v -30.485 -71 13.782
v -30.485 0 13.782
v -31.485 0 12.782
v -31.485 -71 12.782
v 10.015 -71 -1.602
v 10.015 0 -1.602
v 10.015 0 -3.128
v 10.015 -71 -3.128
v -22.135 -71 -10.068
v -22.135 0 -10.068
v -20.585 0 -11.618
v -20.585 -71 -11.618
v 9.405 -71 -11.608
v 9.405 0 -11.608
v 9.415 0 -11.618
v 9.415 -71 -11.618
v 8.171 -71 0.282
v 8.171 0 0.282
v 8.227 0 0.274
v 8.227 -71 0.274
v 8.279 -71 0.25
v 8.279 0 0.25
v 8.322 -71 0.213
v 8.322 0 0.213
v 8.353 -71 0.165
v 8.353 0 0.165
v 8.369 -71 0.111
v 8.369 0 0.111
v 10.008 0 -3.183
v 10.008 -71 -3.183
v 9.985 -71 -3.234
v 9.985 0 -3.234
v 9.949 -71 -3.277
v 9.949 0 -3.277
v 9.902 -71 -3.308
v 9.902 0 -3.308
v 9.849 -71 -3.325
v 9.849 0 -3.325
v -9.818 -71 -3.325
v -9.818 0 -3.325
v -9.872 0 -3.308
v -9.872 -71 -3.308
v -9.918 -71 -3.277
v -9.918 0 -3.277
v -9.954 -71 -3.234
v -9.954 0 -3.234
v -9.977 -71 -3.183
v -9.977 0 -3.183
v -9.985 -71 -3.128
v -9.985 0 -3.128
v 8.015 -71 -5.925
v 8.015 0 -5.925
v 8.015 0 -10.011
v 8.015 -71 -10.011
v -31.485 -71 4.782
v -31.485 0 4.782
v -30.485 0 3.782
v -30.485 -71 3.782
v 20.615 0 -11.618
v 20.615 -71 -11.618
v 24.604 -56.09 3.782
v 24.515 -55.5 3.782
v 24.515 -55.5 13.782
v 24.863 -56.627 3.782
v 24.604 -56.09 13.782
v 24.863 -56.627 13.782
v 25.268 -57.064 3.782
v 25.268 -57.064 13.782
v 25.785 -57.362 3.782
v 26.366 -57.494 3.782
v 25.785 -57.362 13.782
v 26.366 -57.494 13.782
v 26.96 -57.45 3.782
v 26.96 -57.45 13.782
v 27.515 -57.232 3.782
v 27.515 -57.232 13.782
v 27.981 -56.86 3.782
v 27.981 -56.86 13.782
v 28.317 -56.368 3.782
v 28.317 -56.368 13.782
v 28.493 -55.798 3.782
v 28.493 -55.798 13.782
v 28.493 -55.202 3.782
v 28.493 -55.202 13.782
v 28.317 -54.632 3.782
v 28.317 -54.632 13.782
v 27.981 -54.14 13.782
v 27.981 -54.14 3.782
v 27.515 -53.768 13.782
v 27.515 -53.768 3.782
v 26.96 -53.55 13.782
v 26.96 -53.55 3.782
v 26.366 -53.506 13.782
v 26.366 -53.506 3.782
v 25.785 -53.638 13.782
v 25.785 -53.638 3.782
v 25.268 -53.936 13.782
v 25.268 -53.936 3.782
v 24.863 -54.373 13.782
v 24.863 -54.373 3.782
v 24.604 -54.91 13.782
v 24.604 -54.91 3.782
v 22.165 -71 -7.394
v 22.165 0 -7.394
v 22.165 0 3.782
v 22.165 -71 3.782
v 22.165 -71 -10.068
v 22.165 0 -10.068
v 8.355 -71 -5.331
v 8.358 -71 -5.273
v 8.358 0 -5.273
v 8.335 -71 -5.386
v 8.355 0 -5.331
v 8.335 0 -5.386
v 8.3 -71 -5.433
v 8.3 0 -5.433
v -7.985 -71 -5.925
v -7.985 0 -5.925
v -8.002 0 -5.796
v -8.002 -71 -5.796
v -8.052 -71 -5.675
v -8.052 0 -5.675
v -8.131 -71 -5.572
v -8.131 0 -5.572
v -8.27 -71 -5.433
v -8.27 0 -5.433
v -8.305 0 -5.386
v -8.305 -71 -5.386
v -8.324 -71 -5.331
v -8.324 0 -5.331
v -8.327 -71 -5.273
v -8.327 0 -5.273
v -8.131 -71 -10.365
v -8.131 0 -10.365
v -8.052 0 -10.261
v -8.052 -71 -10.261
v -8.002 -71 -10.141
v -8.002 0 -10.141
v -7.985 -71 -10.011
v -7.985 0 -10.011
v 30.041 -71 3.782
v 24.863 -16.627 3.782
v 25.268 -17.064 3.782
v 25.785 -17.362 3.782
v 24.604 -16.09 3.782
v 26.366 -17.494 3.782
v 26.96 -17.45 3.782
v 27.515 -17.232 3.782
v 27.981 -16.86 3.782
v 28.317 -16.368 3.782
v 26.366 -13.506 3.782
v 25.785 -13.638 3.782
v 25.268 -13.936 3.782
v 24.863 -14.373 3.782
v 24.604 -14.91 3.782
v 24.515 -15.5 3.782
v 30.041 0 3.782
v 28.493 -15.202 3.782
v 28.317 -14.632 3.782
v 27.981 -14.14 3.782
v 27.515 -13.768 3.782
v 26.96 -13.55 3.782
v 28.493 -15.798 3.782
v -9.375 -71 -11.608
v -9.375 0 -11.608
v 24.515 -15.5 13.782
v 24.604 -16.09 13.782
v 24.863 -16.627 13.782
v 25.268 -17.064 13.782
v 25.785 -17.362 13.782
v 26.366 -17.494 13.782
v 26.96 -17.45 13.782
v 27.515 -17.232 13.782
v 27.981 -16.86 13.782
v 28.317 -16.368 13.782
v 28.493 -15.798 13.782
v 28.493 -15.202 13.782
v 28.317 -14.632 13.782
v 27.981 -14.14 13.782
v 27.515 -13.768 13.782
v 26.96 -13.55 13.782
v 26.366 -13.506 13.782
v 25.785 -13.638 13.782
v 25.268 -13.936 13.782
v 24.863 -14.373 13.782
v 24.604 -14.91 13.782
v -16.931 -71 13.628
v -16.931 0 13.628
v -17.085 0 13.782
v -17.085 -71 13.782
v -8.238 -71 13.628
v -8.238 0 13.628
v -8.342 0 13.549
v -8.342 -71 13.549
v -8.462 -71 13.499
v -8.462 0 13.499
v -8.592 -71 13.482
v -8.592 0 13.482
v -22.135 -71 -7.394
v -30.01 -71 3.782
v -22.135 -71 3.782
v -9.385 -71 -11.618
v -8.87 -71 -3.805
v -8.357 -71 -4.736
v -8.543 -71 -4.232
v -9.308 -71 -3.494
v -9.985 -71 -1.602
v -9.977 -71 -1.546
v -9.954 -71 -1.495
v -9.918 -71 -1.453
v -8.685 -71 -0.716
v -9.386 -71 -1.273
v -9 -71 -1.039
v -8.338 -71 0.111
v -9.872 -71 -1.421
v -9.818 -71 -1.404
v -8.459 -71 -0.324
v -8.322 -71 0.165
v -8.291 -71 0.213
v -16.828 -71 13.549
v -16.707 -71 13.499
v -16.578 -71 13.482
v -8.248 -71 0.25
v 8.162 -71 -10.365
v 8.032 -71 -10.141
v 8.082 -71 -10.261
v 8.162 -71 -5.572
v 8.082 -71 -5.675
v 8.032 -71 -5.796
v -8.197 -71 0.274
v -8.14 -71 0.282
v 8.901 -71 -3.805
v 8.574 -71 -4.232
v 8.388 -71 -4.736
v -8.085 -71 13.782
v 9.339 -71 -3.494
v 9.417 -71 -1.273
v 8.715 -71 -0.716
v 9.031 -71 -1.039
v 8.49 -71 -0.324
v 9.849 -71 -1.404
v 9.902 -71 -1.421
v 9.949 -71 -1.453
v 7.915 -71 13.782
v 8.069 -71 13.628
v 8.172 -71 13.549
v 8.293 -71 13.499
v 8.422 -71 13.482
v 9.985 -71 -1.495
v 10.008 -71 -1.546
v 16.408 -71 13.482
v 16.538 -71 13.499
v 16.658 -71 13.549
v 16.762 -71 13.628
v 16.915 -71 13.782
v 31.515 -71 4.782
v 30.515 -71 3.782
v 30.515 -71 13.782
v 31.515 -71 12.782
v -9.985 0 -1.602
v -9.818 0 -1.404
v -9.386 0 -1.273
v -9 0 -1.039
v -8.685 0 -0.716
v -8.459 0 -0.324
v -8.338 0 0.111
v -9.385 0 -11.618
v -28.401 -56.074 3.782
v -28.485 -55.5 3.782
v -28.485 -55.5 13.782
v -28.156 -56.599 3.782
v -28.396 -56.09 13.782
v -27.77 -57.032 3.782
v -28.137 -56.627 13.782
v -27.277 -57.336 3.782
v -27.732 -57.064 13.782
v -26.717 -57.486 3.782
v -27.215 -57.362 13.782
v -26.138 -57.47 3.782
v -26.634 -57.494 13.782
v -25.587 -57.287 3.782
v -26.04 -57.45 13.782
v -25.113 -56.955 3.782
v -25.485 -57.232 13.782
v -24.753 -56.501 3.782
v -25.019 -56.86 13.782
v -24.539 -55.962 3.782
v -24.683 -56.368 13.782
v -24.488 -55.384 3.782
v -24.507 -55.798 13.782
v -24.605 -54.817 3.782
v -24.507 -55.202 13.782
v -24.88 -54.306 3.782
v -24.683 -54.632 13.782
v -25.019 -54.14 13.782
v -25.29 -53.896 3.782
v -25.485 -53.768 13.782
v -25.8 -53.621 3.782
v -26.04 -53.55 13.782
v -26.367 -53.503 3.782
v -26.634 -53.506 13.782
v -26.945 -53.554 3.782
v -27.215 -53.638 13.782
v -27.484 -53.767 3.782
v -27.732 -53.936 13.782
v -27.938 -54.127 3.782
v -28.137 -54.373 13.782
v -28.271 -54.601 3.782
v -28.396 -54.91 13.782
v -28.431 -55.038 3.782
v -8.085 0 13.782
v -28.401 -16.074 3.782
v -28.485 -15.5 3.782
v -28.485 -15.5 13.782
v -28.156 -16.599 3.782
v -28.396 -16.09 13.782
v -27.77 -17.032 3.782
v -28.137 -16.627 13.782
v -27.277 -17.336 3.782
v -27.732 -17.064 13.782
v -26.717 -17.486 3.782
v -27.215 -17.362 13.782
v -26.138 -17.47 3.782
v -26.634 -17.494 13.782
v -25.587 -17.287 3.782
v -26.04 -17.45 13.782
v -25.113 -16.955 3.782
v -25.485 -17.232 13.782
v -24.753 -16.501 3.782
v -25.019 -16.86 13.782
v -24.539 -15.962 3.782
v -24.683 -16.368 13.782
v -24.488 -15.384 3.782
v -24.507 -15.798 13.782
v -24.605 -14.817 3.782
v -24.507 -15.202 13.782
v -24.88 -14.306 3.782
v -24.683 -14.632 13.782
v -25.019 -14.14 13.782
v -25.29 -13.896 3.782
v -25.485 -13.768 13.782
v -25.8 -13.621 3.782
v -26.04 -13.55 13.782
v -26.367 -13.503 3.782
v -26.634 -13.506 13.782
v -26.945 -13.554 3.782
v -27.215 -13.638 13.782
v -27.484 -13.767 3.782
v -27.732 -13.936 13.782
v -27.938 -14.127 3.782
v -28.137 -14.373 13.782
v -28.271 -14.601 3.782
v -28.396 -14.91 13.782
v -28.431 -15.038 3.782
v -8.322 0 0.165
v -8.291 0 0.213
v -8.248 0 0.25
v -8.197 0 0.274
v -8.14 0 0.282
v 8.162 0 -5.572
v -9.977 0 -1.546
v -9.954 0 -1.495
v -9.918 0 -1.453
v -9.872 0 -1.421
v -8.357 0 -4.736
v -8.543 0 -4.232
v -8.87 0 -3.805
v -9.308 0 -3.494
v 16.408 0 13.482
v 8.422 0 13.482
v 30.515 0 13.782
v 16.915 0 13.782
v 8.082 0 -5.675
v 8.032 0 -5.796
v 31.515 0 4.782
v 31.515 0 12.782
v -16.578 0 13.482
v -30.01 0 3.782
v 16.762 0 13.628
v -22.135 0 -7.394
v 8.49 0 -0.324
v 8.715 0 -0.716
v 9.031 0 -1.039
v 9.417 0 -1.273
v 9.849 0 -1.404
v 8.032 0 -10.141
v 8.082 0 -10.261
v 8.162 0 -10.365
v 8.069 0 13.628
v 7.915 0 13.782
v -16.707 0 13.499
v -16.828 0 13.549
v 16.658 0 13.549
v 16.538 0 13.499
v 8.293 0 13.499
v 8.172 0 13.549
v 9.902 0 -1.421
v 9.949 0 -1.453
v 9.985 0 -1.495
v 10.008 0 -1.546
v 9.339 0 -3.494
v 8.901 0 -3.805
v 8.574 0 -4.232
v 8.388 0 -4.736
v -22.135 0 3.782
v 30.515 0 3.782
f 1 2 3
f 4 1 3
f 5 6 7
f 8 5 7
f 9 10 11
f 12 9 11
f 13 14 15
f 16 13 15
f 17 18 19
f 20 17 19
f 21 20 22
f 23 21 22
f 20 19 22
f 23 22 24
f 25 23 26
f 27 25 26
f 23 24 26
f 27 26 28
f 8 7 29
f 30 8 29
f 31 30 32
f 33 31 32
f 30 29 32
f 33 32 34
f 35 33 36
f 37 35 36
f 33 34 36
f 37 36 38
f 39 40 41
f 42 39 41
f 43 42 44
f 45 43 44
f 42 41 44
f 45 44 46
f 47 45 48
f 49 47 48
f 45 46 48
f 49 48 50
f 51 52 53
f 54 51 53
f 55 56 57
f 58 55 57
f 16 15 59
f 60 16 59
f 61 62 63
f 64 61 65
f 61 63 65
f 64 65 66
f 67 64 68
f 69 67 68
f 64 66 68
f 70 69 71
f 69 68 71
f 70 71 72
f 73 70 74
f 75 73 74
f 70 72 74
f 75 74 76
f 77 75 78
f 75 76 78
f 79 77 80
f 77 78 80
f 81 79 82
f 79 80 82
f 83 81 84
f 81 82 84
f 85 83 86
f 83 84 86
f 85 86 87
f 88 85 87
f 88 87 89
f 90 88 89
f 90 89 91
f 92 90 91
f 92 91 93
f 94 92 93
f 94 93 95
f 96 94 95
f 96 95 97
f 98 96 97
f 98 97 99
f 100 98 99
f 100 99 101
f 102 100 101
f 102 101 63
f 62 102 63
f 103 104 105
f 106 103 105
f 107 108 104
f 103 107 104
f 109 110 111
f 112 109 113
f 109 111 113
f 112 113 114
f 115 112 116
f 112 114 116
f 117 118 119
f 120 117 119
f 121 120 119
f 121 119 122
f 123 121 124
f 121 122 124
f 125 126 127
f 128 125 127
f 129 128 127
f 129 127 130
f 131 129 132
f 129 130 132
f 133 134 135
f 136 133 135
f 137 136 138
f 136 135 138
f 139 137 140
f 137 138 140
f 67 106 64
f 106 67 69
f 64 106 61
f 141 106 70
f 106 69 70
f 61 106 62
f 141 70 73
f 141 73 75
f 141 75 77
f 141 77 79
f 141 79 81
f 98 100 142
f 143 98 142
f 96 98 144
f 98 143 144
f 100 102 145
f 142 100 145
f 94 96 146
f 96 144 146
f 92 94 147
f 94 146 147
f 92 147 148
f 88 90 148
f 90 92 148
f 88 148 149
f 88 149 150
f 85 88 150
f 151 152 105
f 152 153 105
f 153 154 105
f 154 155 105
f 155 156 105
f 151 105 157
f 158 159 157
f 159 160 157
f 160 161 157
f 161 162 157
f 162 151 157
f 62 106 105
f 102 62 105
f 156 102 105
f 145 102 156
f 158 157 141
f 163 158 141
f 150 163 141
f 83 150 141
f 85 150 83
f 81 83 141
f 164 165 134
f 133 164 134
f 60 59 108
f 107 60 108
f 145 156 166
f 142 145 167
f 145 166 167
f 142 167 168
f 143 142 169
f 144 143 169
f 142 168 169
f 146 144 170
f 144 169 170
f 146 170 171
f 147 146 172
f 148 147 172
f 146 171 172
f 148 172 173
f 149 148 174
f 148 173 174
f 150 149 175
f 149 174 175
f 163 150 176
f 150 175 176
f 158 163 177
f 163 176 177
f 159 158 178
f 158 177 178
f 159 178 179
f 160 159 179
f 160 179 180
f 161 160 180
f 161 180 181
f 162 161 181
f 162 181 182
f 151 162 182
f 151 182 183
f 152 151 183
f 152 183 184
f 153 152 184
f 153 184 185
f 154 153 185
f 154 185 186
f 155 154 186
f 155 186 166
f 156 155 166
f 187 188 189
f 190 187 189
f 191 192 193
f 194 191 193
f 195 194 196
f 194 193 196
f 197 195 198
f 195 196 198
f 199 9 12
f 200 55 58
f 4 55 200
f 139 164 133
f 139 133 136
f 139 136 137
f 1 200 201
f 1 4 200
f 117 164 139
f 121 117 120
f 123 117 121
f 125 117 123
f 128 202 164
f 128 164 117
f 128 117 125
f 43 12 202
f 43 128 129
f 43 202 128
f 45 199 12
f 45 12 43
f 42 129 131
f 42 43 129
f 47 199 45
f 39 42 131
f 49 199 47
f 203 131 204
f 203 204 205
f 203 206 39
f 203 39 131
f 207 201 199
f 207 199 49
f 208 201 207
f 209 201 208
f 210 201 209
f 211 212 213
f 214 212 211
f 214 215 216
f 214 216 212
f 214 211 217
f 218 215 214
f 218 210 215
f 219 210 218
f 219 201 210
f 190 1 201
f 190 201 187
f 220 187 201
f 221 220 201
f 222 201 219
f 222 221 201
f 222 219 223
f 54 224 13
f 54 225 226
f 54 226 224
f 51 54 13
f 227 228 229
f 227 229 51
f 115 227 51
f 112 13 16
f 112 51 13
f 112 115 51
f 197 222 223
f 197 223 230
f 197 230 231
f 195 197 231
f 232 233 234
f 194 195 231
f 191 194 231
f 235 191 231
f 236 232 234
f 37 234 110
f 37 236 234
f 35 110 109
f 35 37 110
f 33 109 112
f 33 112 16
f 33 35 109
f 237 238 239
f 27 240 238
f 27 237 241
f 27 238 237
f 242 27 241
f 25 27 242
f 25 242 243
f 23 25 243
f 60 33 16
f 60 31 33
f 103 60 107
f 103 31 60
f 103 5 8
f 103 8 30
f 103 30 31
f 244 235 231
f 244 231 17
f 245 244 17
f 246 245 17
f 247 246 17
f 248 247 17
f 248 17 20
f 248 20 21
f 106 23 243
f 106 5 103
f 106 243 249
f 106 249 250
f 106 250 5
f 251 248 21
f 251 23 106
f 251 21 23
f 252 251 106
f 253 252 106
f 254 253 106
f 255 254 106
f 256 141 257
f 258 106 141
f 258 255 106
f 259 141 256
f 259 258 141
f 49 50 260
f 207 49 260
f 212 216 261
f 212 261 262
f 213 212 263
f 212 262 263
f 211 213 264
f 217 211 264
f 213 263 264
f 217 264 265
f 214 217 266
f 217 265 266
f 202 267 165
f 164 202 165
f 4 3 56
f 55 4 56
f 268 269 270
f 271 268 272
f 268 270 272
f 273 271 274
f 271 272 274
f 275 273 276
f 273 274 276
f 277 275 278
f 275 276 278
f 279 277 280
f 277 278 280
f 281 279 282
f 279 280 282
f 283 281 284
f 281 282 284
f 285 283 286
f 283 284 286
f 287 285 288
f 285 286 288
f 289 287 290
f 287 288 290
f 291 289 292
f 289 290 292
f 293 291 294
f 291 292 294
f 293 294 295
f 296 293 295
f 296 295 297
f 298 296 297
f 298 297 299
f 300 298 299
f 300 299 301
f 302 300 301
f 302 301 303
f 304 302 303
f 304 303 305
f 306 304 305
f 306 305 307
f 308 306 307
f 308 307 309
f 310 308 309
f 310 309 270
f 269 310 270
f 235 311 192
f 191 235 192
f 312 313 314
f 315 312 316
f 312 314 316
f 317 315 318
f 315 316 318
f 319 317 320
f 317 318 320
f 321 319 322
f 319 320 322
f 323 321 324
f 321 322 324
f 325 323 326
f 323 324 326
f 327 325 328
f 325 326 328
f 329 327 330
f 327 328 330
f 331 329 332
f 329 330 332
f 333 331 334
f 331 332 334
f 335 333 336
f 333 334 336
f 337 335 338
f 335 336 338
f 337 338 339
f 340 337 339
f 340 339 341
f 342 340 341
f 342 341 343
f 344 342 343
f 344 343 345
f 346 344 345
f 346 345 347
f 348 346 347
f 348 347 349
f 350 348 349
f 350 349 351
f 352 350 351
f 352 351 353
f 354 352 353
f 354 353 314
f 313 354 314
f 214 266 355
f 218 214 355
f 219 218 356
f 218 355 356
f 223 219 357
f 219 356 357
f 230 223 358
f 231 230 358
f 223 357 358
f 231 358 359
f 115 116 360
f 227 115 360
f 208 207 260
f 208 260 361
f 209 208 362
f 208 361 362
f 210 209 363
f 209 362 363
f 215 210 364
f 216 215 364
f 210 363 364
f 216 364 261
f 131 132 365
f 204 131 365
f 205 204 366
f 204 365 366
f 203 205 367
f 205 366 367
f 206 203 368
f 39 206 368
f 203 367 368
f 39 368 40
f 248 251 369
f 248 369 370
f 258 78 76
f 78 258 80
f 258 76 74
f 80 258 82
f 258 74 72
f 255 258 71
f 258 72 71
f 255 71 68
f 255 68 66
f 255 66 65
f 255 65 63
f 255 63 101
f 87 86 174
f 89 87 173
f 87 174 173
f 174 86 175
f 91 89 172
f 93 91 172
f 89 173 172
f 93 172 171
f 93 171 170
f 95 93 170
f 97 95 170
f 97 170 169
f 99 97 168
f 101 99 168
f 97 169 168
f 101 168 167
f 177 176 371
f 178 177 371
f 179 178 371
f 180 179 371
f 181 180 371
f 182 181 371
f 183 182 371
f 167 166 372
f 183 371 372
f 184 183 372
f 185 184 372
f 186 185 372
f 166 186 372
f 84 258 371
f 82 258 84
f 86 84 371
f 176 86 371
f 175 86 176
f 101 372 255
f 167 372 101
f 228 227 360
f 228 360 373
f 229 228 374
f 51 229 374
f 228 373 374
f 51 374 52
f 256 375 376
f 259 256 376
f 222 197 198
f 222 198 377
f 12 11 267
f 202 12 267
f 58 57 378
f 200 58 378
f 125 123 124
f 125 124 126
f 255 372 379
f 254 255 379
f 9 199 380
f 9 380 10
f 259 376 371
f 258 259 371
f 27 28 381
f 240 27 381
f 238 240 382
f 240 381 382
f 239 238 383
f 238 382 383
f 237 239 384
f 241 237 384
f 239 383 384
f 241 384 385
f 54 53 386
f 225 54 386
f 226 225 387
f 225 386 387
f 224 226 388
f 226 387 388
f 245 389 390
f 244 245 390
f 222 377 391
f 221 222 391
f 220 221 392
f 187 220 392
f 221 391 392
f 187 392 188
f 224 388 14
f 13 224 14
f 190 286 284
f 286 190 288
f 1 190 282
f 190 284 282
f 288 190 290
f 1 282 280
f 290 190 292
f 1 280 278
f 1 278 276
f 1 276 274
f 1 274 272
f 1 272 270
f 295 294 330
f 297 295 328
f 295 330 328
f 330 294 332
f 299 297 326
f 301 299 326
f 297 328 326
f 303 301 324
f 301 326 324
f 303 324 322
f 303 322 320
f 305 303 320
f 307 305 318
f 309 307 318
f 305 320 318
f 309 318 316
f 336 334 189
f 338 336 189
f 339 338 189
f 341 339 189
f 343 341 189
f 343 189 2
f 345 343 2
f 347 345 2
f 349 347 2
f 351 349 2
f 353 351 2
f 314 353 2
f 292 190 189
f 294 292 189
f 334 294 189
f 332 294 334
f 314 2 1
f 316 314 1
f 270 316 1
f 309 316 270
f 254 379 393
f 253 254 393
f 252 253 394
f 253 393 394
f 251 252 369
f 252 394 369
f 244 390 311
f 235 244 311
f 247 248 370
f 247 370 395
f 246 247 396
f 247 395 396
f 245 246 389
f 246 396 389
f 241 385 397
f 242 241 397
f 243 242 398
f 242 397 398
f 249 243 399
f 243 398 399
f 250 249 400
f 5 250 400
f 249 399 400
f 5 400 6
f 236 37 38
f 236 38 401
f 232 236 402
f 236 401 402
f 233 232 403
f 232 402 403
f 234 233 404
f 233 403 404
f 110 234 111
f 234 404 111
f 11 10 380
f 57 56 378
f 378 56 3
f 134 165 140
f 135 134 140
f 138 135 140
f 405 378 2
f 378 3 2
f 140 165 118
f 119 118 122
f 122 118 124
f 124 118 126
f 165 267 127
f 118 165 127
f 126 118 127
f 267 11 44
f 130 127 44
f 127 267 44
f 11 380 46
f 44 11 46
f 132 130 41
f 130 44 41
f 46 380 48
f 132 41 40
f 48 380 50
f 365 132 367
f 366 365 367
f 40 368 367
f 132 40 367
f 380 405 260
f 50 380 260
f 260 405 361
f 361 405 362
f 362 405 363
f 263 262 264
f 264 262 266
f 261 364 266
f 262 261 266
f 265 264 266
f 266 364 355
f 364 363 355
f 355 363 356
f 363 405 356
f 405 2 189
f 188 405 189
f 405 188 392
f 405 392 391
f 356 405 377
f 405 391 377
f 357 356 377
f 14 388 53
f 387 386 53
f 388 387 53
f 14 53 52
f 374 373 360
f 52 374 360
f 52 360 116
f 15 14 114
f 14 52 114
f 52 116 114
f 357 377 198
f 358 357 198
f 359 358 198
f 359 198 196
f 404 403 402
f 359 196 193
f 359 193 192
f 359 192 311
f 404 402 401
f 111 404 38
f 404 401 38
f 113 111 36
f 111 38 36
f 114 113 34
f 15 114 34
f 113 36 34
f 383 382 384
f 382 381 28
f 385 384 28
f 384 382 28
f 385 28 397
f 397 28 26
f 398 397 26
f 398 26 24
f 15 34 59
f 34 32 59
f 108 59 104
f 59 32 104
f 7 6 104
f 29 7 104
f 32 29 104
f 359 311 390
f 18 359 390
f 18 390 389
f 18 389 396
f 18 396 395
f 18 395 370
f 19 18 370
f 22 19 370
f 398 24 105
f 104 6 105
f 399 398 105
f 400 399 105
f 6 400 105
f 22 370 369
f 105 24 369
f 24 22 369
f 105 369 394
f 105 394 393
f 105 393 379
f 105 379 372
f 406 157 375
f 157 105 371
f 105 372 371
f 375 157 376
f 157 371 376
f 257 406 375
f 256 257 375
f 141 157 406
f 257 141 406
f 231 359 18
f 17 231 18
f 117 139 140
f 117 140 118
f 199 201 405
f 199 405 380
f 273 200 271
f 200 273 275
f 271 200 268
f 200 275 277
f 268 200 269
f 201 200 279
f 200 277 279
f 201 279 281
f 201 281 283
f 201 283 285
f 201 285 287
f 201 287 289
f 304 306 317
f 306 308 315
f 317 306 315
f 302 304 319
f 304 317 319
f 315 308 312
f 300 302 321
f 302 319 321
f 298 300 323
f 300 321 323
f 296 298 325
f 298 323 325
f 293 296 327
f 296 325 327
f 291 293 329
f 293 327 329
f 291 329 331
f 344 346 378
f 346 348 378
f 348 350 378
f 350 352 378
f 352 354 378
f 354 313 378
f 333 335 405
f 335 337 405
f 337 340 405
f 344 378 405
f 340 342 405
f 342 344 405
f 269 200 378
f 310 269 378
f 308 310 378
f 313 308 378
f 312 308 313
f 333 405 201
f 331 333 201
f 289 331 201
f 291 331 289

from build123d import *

# Parameters (mm, degrees)
F1_DEPTH = 71
F3_D     = 4


# Not quite as in the source:
# - ends of sketch curves that miss each other by under 0.0002 mm in the source are joined


with BuildPart() as f1:
    # F0 (on Front) → F1 (new body)
    with BuildSketch(Plane.XZ):
        with BuildLine():
            Line((8.1618498422, -10.3647895785), (9.4053820611, -11.6083214649))
            Line((9.4053820611, -11.6083214649), (9.415382064, -11.6183214649))
            Line((9.415382064, -11.6183214649), (20.6153802021, -11.6183214651))
            Line((20.6153802021, -11.6183214651), (22.165411006, -10.0682906612))
            Line((22.165411006, -10.0682906612), (22.1654110059, -7.3944052326))
            Line((22.1654110059, -7.3944052326), (22.1654110059, 3.7817118842))
            Line((22.1654110059, 3.7817118842), (30.0405793841, 3.7817118842))
            Line((30.0405793841, 3.7817118842), (30.515407573, 3.7817104728))
            Line((30.515407573, 3.7817104728), (31.5154075725, 4.7816793802))
            Line((31.5154075725, 4.7816793802), (31.5153703792, 12.7817118841))
            Line((31.5153703792, 12.7817118841), (30.5153417686, 13.7816508489))
            Line((30.5153417686, 13.7816508489), (16.9153093619, 13.7816508489))
            Line((16.9153093619, 13.7816508489), (16.7618646746, 13.6281611659))
            ThreePointArc((16.7618646746, 13.6281611659), (16.5996530095, 13.5197747929), (16.4083113037, 13.4817145544))
            Line((16.4083113037, 13.4817145544), (8.422430452, 13.4817145544))
            ThreePointArc((8.422430452, 13.4817145544), (8.2310887291, 13.5197747818), (8.0688770472, 13.6281611561))
            Line((8.0688770472, 13.6281611561), (7.9153584589, 13.7816508489))
            Line((7.9153584589, 13.7816508489), (-8.0846315282, 13.7816508491))
            Line((-8.0846315282, 13.7816508491), (-8.2381152983, 13.628161166))
            ThreePointArc((-8.2381152983, 13.628161166), (-8.4003269909, 13.5197747816), (-8.5916687288, 13.4817145545))
            Line((-8.5916687288, 13.4817145545), (-16.5775495805, 13.4817145545))
            ThreePointArc((-16.5775495805, 13.4817145545), (-16.7688912713, 13.5197747934), (-16.9311029256, 13.6281611562))
            Line((-16.9311029256, 13.6281611562), (-17.0845685953, 13.7816508491))
            Line((-17.0845685953, 13.7816508491), (-30.4846162694, 13.7816508492))
            Line((-30.4846162694, 13.7816508492), (-31.4846296209, 12.7816374978))
            Line((-31.4846296209, 12.7816374978), (-31.4846296209, 4.7816793804))
            Line((-31.4846296209, 4.7816793804), (-30.4846296214, 3.781710473))
            Line((-30.4846296214, 3.781710473), (-30.0098014316, 3.7817118844))
            Line((-30.0098014316, 3.7817118844), (-22.1346330541, 3.781710473))
            Line((-22.1346330541, 3.781710473), (-22.1346330541, -7.3944052328))
            Line((-22.1346330541, -7.3944052328), (-22.134633054, -10.068299435))
            Line((-22.134633054, -10.068299435), (-20.5846110242, -11.6183214649))
            Line((-20.5846110242, -11.6183214649), (-9.3846416371, -11.618321465))
            Line((-9.3846416371, -11.618321465), (-9.3746416371, -11.6083214649))
            Line((-9.3746416371, -11.6083214649), (-8.1310434239, -10.3647232516))
            ThreePointArc((-8.1310434239, -10.3647232516), (-8.0226570482, -10.2025115772), (-7.9845968145, -10.011169861))
            Line((-7.9845968145, -10.011169861), (-7.9845968145, -5.9254873742))
            ThreePointArc((-7.9845968145, -5.9254873742), (-8.0226567217, -5.7341464462), (-8.1310422173, -5.5719351901))
            Line((-8.1310422173, -5.5719351901), (-8.2697056959, -5.4332707651))
            ThreePointArc((-8.2697056959, -5.4332707651), (-8.3164840652, -5.3595306247), (-8.3273828922, -5.2728874501))
            ThreePointArc((-8.3273828922, -5.2728874501), (-8.6904695936, -4.0063582713), (-9.8182893525, -3.3252190015))
            ThreePointArc((-9.8182893525, -3.3252190015), (-9.9374803464, -3.2570419887), (-9.9846168416, -3.1280739736))
            Line((-9.9846168416, -3.1280739736), (-9.9846168416, -1.6015777605))
            ThreePointArc((-9.9846168416, -1.6015777605), (-9.9374803464, -1.4726097454), (-9.8182893525, -1.4044327326))
            ThreePointArc((-9.8182893525, -1.4044327326), (-8.8323144095, -0.8871586543), (-8.3383526746, 0.1106994843))
            ThreePointArc((-8.3383526746, 0.1106994843), (-8.2712261249, 0.2330065304), (-8.1404708137, 0.2816689983))
            Line((-8.1404708137, 0.2816689983), (8.1712371304, 0.2816689983))
            ThreePointArc((8.1712371304, 0.2816689983), (8.3019924416, 0.2330065304), (8.3691189913, 0.1106994843))
            ThreePointArc((8.3691189913, 0.1106994843), (8.8630871156, -0.8871651956), (9.8490736962, -1.4044358116))
            ThreePointArc((9.8490736962, -1.4044358116), (9.968266036, -1.4726123905), (10.0154031856, -1.6015811811))
            Line((10.0154031856, -1.6015811811), (10.0154031856, -3.1280705531))
            ThreePointArc((10.0154031856, -3.1280705531), (9.968266036, -3.2570393436), (9.8490736962, -3.3252159226))
            ThreePointArc((9.8490736962, -3.3252159226), (8.7212476918, -4.0063428806), (8.3581472677, -5.2728670656))
            ThreePointArc((8.3581472677, -5.2728670656), (8.3472477253, -5.3595093685), (8.3004693733, -5.4332486014))
            Line((8.3004693733, -5.4332486014), (8.161849795, -5.5718681798))
            ThreePointArc((8.161849795, -5.5718681798), (8.0534634193, -5.7340798542), (8.0154031856, -5.9254215704))
            Line((8.0154031856, -5.9254215704), (8.0154031855, -10.0112361406))
            ThreePointArc((8.0154031855, -10.0112361406), (8.0534634321, -10.2025778877), (8.1618498422, -10.3647895785))
        make_face()
    extrude(amount=F1_DEPTH)

    # F3 (through all)
    with Locations(Plane(origin=(0, 0, 0.2816689983), x_dir=(1, 0, 0), z_dir=(0, 0, -1))):
        with Locations((-26.4846296209, 55.5), (26.5153703791, 55.5), (26.5153703791, 15.5), (-26.4846296209, 15.5)):
            Hole(F3_D / 2)


solid = f1.part
